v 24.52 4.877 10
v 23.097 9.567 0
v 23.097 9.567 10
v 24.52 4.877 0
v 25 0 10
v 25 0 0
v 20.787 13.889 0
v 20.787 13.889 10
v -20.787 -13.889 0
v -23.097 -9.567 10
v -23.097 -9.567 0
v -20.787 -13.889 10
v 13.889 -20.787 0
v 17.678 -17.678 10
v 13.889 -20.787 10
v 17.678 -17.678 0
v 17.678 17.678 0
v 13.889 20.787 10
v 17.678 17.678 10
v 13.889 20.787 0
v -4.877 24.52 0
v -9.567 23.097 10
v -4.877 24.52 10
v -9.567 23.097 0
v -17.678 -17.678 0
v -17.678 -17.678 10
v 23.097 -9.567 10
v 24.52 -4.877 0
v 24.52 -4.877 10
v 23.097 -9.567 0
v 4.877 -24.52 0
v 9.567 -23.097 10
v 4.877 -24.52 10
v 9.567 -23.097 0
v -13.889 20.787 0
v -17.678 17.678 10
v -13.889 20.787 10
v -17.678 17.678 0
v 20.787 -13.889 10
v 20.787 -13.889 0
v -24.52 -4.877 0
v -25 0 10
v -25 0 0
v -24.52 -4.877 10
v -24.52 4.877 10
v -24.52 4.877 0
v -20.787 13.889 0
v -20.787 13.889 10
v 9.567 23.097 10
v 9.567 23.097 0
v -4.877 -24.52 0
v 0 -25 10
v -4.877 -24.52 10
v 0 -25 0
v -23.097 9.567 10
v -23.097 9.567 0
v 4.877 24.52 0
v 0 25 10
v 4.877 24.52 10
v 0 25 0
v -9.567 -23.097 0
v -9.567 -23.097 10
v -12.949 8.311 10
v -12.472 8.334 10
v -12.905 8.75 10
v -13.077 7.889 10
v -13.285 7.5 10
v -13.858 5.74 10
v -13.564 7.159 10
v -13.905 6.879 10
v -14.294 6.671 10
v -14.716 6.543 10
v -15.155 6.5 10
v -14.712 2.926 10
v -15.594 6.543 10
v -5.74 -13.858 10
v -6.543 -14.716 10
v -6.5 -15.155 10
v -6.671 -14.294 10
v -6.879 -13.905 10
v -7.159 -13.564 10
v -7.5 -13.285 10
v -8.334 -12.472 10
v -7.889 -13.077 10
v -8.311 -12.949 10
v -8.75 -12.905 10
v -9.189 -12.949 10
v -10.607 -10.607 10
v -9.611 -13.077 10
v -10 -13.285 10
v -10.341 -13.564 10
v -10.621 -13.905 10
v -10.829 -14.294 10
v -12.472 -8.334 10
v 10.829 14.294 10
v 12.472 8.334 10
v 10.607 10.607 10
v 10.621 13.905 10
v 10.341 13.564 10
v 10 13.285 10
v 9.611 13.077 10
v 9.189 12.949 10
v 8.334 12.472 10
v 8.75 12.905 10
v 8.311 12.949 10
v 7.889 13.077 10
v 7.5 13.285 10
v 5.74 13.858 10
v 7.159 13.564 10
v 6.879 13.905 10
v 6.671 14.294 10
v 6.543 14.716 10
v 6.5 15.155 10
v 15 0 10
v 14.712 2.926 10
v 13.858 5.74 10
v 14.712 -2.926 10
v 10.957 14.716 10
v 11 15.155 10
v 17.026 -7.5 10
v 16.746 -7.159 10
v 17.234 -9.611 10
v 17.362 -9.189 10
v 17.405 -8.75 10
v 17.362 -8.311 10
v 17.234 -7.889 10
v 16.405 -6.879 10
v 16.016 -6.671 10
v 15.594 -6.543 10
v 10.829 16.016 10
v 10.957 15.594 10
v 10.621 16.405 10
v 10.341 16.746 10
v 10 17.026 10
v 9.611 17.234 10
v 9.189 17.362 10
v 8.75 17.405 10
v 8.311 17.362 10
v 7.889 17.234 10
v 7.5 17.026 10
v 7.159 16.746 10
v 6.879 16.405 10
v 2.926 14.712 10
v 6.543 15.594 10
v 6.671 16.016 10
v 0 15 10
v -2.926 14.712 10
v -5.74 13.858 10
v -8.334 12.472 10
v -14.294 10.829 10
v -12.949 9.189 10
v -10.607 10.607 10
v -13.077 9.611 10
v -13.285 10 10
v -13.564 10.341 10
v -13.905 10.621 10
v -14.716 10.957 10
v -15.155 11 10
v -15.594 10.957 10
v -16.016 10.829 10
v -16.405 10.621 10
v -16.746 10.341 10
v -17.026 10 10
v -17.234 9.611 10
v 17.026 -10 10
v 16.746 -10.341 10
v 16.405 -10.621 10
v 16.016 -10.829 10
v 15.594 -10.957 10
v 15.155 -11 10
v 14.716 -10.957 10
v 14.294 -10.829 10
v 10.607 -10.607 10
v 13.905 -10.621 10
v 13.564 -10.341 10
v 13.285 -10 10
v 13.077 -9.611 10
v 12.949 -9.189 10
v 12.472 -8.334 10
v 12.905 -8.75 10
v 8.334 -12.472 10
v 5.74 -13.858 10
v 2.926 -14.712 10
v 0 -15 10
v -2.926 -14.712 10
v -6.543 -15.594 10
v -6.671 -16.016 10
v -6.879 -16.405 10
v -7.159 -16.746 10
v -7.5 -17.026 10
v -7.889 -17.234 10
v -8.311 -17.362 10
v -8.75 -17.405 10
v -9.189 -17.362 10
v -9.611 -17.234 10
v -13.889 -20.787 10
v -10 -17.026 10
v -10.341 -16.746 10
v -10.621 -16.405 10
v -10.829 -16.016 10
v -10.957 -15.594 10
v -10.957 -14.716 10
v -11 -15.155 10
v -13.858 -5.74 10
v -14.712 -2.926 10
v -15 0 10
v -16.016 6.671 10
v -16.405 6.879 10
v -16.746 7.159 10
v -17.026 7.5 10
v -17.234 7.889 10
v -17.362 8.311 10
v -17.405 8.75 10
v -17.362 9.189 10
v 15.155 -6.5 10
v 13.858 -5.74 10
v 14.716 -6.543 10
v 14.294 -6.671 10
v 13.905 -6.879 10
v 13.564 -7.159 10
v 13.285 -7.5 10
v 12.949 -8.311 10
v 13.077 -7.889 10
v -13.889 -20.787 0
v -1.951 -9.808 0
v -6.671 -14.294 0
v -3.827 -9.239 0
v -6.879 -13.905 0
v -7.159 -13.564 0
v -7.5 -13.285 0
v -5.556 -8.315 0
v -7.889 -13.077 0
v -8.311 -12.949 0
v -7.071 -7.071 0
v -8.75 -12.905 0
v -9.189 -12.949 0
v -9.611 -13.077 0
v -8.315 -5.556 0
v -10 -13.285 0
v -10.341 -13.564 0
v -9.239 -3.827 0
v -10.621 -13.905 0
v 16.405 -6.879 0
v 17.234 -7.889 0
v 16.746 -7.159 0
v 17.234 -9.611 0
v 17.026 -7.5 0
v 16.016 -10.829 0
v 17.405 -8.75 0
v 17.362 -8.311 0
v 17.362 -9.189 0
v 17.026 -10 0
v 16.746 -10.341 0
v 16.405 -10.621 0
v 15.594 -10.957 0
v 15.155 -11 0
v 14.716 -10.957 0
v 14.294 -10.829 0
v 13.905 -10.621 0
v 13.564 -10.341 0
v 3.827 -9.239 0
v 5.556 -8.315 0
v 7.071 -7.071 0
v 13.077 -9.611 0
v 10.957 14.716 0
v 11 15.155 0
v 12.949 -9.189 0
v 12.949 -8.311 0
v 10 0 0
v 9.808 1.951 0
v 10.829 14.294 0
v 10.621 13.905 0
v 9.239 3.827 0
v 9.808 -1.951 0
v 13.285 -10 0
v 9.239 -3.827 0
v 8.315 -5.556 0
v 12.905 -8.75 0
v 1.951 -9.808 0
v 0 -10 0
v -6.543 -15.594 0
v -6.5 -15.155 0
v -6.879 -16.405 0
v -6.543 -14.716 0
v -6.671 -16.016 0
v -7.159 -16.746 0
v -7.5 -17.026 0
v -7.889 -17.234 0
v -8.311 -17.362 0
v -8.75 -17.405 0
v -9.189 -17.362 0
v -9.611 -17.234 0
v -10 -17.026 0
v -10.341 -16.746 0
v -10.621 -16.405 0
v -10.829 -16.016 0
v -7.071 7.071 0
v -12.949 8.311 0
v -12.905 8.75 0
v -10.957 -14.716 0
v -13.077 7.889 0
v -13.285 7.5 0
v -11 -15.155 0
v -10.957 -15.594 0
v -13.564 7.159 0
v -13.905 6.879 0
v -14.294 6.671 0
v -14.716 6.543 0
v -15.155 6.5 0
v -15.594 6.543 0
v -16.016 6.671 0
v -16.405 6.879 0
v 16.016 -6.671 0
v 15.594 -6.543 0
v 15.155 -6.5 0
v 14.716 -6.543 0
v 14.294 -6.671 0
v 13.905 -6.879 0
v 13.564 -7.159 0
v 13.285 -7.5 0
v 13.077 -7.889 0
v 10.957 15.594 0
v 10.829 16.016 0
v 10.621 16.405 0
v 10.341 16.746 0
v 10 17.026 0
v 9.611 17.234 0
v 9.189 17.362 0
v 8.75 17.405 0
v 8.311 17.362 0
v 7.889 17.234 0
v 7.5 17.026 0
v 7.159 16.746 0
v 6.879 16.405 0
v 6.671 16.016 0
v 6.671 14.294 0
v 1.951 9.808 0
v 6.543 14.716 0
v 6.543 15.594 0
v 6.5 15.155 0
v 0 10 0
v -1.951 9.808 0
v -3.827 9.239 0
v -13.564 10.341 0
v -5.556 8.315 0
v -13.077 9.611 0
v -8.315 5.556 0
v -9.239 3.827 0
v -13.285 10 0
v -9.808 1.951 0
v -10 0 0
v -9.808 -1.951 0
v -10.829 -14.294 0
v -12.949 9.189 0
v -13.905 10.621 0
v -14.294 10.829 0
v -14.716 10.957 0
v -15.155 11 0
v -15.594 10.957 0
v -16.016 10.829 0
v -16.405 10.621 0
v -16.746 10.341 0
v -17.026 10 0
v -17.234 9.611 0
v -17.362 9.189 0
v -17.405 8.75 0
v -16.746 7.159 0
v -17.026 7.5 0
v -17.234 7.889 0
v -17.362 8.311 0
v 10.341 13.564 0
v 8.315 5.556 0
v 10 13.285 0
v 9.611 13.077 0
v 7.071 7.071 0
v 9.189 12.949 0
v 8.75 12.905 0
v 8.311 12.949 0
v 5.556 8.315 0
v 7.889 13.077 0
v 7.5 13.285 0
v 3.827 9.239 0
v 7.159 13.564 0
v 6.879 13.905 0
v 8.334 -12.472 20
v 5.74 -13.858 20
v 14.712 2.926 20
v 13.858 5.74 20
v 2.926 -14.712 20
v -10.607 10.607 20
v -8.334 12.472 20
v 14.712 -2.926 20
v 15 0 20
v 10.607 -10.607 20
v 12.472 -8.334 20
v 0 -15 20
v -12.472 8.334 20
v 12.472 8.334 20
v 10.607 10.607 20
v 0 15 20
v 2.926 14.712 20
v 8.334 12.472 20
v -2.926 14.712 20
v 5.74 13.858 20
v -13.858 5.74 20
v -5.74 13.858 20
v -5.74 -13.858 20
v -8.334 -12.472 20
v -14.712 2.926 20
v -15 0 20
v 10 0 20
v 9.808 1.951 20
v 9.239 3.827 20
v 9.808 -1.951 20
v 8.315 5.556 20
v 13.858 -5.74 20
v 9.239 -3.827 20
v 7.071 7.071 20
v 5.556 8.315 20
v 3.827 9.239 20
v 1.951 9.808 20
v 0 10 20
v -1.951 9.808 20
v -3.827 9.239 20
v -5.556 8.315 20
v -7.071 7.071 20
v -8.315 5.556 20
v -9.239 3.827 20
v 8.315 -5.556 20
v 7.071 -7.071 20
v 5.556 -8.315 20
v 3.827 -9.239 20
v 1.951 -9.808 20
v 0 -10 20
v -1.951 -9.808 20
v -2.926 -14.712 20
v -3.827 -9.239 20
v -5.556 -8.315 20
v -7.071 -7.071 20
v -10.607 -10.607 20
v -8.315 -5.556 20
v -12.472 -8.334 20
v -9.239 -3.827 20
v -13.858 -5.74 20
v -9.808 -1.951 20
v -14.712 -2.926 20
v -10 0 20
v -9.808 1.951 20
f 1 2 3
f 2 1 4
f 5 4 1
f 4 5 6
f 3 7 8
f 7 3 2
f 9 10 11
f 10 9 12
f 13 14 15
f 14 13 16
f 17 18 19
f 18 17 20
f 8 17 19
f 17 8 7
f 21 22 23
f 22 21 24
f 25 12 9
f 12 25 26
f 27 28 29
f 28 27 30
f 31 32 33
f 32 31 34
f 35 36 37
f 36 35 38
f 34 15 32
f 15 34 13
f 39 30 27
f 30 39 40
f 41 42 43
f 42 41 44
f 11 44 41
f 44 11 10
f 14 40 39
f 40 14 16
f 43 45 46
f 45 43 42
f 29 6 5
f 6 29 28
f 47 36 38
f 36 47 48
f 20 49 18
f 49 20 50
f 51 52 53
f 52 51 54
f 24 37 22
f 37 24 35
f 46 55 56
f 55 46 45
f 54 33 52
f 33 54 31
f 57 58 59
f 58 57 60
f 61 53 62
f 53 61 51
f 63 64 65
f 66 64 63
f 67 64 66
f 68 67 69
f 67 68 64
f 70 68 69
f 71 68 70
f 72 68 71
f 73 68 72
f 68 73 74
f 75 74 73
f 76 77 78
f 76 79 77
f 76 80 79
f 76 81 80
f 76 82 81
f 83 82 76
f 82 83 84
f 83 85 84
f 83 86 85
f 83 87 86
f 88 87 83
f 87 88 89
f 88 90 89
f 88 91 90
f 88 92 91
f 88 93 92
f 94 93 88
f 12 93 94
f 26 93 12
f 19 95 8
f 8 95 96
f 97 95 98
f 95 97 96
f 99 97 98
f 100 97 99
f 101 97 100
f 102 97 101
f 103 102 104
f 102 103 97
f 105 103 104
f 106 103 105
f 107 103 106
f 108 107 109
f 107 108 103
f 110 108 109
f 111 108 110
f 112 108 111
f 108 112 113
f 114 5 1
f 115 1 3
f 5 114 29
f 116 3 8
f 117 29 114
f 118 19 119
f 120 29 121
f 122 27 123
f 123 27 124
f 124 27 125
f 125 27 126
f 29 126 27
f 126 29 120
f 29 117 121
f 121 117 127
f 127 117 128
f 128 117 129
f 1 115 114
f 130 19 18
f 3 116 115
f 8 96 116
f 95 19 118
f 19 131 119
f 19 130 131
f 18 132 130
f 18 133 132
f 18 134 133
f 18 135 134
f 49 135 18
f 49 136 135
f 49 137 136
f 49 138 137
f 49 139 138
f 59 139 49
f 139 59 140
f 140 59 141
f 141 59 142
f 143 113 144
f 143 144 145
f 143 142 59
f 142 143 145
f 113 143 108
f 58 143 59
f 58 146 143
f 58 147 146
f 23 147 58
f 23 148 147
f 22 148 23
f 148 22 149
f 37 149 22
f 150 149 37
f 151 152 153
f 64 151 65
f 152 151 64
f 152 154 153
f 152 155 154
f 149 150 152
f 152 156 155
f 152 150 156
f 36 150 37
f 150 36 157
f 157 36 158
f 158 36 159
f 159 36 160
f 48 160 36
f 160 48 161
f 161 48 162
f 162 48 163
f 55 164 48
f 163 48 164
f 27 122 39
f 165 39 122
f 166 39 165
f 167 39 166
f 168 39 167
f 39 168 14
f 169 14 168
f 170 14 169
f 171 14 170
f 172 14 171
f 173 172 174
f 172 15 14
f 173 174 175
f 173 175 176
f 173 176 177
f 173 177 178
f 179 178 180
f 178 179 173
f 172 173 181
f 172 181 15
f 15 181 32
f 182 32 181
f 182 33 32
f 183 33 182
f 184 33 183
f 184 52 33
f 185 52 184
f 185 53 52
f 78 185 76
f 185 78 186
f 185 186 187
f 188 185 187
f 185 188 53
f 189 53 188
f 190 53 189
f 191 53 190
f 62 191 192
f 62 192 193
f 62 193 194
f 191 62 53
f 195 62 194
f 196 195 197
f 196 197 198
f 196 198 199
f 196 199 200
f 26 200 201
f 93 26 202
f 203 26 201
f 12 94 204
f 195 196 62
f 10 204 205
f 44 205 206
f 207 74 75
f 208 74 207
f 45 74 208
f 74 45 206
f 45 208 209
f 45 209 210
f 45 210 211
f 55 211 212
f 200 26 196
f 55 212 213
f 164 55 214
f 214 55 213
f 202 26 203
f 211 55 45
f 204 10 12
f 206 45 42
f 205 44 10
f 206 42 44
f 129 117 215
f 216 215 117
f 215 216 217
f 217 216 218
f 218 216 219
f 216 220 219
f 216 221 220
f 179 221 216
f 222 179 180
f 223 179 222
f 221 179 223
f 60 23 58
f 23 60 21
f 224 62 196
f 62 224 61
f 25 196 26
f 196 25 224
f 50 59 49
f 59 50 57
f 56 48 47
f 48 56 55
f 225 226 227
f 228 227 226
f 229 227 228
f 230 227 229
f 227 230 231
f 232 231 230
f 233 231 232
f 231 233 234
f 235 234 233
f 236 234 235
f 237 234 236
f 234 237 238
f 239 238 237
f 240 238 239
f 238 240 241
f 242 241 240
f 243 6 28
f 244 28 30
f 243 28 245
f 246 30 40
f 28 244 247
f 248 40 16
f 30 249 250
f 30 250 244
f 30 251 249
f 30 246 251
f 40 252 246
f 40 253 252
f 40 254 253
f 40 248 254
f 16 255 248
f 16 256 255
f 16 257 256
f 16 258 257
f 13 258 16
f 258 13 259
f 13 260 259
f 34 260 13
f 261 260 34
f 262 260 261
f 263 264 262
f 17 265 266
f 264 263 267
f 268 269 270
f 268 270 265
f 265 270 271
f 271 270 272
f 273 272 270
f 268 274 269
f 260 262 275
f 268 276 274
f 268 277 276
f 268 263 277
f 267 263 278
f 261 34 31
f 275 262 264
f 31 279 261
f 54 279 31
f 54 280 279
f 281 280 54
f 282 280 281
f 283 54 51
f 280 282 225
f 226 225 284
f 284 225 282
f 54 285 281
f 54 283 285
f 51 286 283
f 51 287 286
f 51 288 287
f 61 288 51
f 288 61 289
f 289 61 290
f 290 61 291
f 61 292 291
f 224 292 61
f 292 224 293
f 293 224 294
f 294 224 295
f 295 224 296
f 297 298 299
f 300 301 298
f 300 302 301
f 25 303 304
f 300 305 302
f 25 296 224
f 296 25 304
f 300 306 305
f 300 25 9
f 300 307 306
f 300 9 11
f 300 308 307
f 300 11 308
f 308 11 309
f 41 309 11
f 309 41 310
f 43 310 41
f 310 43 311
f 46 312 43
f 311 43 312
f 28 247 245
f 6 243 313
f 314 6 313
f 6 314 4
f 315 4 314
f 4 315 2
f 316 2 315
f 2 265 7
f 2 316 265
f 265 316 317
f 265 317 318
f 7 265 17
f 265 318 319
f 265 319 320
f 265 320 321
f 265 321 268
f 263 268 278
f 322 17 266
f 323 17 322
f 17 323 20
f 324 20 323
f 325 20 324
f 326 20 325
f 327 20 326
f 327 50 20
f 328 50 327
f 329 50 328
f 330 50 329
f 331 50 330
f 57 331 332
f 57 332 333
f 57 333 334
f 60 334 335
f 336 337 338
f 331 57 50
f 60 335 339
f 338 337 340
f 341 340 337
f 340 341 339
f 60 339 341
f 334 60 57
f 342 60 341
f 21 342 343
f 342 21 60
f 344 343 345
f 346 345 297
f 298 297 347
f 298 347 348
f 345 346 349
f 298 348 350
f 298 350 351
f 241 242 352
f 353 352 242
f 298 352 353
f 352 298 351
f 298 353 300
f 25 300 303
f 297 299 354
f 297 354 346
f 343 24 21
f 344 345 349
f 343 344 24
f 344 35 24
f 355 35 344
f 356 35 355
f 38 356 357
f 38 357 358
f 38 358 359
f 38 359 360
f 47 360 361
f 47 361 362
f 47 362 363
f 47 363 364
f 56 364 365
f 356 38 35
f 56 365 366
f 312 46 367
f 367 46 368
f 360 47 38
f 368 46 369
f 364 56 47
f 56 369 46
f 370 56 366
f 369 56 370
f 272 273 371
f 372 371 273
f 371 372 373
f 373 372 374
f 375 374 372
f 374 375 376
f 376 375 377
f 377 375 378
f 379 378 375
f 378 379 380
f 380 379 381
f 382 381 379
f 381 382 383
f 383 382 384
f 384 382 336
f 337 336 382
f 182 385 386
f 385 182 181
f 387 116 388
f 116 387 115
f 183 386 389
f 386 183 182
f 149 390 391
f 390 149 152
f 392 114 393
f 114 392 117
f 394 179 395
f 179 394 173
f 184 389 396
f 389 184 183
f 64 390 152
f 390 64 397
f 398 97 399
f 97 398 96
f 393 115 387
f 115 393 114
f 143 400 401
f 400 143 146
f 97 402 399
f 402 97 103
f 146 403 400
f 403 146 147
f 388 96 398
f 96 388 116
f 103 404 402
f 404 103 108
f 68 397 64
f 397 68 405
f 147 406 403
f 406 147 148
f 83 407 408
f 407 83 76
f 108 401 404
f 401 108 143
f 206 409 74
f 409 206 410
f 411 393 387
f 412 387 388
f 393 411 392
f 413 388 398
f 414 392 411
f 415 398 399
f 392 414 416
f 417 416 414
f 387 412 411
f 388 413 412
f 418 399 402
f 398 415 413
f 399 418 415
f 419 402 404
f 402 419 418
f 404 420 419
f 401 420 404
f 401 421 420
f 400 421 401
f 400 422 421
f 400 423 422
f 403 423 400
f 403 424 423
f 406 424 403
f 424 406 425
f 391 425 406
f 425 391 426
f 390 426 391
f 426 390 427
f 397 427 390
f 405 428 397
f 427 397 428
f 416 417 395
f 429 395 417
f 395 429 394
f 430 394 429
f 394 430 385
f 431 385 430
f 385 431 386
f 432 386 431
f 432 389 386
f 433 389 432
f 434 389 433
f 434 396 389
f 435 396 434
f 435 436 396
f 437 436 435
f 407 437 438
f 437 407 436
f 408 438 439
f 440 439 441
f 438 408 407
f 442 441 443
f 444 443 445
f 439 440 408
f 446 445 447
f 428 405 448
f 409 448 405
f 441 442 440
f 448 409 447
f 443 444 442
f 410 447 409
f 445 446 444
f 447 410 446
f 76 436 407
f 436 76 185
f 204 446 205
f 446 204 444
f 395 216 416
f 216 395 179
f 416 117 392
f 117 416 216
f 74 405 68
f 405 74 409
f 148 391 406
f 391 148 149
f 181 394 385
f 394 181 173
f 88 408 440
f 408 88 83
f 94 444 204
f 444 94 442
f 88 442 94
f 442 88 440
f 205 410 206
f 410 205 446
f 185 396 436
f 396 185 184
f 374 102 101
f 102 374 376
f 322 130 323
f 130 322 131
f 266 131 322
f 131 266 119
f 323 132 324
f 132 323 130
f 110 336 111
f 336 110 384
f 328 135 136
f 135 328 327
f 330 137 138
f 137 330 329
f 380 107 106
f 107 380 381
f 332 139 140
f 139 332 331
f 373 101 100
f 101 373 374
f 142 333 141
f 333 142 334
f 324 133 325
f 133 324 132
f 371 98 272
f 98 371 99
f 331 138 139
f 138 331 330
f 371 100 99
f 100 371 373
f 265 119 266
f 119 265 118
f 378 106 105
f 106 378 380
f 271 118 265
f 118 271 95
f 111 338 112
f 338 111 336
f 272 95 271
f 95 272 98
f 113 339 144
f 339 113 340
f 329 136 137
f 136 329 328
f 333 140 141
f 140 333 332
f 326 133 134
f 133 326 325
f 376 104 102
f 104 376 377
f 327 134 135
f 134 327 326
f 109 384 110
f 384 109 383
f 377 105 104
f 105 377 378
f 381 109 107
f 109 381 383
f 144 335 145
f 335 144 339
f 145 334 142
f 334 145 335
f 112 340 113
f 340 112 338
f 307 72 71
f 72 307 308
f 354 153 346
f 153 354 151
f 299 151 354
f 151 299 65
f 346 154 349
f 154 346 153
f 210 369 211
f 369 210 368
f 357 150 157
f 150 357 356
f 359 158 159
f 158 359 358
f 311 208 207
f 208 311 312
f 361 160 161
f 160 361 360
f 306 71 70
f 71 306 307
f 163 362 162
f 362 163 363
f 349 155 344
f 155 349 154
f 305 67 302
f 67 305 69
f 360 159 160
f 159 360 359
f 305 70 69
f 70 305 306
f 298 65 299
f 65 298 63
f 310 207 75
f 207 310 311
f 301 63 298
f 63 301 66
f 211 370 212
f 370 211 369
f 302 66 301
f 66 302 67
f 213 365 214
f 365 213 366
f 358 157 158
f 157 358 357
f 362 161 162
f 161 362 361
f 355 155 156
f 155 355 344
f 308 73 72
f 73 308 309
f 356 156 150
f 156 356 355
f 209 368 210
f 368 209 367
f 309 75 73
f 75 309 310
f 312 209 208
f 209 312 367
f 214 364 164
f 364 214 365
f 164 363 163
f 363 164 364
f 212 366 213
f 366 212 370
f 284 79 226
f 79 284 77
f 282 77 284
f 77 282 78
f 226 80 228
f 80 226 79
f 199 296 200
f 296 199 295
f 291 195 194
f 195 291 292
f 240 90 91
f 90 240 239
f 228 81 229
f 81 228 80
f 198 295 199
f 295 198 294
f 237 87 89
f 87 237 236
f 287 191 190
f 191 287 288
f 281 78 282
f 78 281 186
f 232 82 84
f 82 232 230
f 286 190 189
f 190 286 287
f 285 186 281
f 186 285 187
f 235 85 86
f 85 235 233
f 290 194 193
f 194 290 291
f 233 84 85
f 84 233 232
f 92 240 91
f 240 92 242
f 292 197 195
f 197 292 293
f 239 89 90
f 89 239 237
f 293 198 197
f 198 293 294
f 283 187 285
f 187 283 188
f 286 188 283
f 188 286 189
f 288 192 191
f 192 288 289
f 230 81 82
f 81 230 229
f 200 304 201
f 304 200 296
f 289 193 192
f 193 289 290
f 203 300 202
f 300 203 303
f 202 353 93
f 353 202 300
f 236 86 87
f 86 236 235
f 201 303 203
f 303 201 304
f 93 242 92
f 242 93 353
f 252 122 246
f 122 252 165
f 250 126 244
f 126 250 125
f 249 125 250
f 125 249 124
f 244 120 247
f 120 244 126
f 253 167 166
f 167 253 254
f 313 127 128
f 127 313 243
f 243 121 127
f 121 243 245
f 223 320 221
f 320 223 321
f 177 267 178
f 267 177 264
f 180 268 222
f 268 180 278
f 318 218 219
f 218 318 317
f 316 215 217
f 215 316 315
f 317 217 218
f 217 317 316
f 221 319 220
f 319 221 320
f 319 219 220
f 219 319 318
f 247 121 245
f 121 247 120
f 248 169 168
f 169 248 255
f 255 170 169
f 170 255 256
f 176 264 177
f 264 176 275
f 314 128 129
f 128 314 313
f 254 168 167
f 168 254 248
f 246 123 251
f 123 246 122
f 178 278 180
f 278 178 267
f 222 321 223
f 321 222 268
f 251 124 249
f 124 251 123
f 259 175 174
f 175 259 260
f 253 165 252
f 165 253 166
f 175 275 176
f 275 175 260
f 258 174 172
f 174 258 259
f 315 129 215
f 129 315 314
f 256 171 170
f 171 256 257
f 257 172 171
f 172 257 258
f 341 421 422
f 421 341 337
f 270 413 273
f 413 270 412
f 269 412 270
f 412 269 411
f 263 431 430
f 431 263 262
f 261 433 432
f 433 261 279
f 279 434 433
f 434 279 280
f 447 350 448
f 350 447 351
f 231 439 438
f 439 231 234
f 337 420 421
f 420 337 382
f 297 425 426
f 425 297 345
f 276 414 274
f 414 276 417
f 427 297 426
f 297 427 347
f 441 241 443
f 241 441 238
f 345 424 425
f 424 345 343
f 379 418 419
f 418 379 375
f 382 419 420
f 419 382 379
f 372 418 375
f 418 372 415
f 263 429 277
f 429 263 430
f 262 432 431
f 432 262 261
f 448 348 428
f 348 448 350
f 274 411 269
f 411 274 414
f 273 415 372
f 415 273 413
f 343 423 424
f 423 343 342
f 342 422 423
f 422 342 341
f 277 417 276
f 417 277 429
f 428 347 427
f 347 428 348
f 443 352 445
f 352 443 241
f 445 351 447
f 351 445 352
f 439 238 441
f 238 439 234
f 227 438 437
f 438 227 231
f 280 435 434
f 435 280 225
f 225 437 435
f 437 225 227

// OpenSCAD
$fn = 32;

// ----------------------------------------------------------------------
// Flange Ø50 x 10
// 4 holes on a Ø35 bolt circle, bolted joints
// ----------------------------------------------------------------------

// --- parameters (mm) ---
flange_d = 50;   // outside diameter of the flange
thickness = 10;  // flange thickness
holes = 4;       // number of bolt holes
pcd = 35;        // bolt circle diameter
start_deg = 60;  // angle of the first hole, from +X
hole_d = 4.5;    // bolt hole diameter
bore_d = 20;     // central through bore
hub_d = 30;      // hub outside diameter
hub_h = 10;      // hub height above the flange face (0 = no hub)

// --- derived feature positions (mm) ---
height = thickness + hub_h;  // = 20   overall height of the part
pcd_r = pcd / 2;             // = 17.5   bolt circle radius
hole_step = 360 / holes;     // = 90   angular pitch
feature_centers = [
  [pcd_r * cos(start_deg + 0 * hole_step), pcd_r * sin(start_deg + 0 * hole_step)],
  [pcd_r * cos(start_deg + 1 * hole_step), pcd_r * sin(start_deg + 1 * hole_step)],
  [pcd_r * cos(start_deg + 2 * hole_step), pcd_r * sin(start_deg + 2 * hole_step)],
  [pcd_r * cos(start_deg + 3 * hole_step), pcd_r * sin(start_deg + 3 * hole_step)]
];   // bolt hole centres on the pitch circle

// flange disc, every hole and the bore cut straight through
difference() {
  union() {
    cylinder(d = flange_d, h = thickness);
    cylinder(d = hub_d, h = height);  // hub, overlapped into the flange
  }
  translate([0, 0, -1]) cylinder(d = bore_d, h = height + 2);  // bore, through
  for (centre = feature_centers)
    translate([centre[0], centre[1], -1]) cylinder(d = hole_d, h = thickness + 2);
}
